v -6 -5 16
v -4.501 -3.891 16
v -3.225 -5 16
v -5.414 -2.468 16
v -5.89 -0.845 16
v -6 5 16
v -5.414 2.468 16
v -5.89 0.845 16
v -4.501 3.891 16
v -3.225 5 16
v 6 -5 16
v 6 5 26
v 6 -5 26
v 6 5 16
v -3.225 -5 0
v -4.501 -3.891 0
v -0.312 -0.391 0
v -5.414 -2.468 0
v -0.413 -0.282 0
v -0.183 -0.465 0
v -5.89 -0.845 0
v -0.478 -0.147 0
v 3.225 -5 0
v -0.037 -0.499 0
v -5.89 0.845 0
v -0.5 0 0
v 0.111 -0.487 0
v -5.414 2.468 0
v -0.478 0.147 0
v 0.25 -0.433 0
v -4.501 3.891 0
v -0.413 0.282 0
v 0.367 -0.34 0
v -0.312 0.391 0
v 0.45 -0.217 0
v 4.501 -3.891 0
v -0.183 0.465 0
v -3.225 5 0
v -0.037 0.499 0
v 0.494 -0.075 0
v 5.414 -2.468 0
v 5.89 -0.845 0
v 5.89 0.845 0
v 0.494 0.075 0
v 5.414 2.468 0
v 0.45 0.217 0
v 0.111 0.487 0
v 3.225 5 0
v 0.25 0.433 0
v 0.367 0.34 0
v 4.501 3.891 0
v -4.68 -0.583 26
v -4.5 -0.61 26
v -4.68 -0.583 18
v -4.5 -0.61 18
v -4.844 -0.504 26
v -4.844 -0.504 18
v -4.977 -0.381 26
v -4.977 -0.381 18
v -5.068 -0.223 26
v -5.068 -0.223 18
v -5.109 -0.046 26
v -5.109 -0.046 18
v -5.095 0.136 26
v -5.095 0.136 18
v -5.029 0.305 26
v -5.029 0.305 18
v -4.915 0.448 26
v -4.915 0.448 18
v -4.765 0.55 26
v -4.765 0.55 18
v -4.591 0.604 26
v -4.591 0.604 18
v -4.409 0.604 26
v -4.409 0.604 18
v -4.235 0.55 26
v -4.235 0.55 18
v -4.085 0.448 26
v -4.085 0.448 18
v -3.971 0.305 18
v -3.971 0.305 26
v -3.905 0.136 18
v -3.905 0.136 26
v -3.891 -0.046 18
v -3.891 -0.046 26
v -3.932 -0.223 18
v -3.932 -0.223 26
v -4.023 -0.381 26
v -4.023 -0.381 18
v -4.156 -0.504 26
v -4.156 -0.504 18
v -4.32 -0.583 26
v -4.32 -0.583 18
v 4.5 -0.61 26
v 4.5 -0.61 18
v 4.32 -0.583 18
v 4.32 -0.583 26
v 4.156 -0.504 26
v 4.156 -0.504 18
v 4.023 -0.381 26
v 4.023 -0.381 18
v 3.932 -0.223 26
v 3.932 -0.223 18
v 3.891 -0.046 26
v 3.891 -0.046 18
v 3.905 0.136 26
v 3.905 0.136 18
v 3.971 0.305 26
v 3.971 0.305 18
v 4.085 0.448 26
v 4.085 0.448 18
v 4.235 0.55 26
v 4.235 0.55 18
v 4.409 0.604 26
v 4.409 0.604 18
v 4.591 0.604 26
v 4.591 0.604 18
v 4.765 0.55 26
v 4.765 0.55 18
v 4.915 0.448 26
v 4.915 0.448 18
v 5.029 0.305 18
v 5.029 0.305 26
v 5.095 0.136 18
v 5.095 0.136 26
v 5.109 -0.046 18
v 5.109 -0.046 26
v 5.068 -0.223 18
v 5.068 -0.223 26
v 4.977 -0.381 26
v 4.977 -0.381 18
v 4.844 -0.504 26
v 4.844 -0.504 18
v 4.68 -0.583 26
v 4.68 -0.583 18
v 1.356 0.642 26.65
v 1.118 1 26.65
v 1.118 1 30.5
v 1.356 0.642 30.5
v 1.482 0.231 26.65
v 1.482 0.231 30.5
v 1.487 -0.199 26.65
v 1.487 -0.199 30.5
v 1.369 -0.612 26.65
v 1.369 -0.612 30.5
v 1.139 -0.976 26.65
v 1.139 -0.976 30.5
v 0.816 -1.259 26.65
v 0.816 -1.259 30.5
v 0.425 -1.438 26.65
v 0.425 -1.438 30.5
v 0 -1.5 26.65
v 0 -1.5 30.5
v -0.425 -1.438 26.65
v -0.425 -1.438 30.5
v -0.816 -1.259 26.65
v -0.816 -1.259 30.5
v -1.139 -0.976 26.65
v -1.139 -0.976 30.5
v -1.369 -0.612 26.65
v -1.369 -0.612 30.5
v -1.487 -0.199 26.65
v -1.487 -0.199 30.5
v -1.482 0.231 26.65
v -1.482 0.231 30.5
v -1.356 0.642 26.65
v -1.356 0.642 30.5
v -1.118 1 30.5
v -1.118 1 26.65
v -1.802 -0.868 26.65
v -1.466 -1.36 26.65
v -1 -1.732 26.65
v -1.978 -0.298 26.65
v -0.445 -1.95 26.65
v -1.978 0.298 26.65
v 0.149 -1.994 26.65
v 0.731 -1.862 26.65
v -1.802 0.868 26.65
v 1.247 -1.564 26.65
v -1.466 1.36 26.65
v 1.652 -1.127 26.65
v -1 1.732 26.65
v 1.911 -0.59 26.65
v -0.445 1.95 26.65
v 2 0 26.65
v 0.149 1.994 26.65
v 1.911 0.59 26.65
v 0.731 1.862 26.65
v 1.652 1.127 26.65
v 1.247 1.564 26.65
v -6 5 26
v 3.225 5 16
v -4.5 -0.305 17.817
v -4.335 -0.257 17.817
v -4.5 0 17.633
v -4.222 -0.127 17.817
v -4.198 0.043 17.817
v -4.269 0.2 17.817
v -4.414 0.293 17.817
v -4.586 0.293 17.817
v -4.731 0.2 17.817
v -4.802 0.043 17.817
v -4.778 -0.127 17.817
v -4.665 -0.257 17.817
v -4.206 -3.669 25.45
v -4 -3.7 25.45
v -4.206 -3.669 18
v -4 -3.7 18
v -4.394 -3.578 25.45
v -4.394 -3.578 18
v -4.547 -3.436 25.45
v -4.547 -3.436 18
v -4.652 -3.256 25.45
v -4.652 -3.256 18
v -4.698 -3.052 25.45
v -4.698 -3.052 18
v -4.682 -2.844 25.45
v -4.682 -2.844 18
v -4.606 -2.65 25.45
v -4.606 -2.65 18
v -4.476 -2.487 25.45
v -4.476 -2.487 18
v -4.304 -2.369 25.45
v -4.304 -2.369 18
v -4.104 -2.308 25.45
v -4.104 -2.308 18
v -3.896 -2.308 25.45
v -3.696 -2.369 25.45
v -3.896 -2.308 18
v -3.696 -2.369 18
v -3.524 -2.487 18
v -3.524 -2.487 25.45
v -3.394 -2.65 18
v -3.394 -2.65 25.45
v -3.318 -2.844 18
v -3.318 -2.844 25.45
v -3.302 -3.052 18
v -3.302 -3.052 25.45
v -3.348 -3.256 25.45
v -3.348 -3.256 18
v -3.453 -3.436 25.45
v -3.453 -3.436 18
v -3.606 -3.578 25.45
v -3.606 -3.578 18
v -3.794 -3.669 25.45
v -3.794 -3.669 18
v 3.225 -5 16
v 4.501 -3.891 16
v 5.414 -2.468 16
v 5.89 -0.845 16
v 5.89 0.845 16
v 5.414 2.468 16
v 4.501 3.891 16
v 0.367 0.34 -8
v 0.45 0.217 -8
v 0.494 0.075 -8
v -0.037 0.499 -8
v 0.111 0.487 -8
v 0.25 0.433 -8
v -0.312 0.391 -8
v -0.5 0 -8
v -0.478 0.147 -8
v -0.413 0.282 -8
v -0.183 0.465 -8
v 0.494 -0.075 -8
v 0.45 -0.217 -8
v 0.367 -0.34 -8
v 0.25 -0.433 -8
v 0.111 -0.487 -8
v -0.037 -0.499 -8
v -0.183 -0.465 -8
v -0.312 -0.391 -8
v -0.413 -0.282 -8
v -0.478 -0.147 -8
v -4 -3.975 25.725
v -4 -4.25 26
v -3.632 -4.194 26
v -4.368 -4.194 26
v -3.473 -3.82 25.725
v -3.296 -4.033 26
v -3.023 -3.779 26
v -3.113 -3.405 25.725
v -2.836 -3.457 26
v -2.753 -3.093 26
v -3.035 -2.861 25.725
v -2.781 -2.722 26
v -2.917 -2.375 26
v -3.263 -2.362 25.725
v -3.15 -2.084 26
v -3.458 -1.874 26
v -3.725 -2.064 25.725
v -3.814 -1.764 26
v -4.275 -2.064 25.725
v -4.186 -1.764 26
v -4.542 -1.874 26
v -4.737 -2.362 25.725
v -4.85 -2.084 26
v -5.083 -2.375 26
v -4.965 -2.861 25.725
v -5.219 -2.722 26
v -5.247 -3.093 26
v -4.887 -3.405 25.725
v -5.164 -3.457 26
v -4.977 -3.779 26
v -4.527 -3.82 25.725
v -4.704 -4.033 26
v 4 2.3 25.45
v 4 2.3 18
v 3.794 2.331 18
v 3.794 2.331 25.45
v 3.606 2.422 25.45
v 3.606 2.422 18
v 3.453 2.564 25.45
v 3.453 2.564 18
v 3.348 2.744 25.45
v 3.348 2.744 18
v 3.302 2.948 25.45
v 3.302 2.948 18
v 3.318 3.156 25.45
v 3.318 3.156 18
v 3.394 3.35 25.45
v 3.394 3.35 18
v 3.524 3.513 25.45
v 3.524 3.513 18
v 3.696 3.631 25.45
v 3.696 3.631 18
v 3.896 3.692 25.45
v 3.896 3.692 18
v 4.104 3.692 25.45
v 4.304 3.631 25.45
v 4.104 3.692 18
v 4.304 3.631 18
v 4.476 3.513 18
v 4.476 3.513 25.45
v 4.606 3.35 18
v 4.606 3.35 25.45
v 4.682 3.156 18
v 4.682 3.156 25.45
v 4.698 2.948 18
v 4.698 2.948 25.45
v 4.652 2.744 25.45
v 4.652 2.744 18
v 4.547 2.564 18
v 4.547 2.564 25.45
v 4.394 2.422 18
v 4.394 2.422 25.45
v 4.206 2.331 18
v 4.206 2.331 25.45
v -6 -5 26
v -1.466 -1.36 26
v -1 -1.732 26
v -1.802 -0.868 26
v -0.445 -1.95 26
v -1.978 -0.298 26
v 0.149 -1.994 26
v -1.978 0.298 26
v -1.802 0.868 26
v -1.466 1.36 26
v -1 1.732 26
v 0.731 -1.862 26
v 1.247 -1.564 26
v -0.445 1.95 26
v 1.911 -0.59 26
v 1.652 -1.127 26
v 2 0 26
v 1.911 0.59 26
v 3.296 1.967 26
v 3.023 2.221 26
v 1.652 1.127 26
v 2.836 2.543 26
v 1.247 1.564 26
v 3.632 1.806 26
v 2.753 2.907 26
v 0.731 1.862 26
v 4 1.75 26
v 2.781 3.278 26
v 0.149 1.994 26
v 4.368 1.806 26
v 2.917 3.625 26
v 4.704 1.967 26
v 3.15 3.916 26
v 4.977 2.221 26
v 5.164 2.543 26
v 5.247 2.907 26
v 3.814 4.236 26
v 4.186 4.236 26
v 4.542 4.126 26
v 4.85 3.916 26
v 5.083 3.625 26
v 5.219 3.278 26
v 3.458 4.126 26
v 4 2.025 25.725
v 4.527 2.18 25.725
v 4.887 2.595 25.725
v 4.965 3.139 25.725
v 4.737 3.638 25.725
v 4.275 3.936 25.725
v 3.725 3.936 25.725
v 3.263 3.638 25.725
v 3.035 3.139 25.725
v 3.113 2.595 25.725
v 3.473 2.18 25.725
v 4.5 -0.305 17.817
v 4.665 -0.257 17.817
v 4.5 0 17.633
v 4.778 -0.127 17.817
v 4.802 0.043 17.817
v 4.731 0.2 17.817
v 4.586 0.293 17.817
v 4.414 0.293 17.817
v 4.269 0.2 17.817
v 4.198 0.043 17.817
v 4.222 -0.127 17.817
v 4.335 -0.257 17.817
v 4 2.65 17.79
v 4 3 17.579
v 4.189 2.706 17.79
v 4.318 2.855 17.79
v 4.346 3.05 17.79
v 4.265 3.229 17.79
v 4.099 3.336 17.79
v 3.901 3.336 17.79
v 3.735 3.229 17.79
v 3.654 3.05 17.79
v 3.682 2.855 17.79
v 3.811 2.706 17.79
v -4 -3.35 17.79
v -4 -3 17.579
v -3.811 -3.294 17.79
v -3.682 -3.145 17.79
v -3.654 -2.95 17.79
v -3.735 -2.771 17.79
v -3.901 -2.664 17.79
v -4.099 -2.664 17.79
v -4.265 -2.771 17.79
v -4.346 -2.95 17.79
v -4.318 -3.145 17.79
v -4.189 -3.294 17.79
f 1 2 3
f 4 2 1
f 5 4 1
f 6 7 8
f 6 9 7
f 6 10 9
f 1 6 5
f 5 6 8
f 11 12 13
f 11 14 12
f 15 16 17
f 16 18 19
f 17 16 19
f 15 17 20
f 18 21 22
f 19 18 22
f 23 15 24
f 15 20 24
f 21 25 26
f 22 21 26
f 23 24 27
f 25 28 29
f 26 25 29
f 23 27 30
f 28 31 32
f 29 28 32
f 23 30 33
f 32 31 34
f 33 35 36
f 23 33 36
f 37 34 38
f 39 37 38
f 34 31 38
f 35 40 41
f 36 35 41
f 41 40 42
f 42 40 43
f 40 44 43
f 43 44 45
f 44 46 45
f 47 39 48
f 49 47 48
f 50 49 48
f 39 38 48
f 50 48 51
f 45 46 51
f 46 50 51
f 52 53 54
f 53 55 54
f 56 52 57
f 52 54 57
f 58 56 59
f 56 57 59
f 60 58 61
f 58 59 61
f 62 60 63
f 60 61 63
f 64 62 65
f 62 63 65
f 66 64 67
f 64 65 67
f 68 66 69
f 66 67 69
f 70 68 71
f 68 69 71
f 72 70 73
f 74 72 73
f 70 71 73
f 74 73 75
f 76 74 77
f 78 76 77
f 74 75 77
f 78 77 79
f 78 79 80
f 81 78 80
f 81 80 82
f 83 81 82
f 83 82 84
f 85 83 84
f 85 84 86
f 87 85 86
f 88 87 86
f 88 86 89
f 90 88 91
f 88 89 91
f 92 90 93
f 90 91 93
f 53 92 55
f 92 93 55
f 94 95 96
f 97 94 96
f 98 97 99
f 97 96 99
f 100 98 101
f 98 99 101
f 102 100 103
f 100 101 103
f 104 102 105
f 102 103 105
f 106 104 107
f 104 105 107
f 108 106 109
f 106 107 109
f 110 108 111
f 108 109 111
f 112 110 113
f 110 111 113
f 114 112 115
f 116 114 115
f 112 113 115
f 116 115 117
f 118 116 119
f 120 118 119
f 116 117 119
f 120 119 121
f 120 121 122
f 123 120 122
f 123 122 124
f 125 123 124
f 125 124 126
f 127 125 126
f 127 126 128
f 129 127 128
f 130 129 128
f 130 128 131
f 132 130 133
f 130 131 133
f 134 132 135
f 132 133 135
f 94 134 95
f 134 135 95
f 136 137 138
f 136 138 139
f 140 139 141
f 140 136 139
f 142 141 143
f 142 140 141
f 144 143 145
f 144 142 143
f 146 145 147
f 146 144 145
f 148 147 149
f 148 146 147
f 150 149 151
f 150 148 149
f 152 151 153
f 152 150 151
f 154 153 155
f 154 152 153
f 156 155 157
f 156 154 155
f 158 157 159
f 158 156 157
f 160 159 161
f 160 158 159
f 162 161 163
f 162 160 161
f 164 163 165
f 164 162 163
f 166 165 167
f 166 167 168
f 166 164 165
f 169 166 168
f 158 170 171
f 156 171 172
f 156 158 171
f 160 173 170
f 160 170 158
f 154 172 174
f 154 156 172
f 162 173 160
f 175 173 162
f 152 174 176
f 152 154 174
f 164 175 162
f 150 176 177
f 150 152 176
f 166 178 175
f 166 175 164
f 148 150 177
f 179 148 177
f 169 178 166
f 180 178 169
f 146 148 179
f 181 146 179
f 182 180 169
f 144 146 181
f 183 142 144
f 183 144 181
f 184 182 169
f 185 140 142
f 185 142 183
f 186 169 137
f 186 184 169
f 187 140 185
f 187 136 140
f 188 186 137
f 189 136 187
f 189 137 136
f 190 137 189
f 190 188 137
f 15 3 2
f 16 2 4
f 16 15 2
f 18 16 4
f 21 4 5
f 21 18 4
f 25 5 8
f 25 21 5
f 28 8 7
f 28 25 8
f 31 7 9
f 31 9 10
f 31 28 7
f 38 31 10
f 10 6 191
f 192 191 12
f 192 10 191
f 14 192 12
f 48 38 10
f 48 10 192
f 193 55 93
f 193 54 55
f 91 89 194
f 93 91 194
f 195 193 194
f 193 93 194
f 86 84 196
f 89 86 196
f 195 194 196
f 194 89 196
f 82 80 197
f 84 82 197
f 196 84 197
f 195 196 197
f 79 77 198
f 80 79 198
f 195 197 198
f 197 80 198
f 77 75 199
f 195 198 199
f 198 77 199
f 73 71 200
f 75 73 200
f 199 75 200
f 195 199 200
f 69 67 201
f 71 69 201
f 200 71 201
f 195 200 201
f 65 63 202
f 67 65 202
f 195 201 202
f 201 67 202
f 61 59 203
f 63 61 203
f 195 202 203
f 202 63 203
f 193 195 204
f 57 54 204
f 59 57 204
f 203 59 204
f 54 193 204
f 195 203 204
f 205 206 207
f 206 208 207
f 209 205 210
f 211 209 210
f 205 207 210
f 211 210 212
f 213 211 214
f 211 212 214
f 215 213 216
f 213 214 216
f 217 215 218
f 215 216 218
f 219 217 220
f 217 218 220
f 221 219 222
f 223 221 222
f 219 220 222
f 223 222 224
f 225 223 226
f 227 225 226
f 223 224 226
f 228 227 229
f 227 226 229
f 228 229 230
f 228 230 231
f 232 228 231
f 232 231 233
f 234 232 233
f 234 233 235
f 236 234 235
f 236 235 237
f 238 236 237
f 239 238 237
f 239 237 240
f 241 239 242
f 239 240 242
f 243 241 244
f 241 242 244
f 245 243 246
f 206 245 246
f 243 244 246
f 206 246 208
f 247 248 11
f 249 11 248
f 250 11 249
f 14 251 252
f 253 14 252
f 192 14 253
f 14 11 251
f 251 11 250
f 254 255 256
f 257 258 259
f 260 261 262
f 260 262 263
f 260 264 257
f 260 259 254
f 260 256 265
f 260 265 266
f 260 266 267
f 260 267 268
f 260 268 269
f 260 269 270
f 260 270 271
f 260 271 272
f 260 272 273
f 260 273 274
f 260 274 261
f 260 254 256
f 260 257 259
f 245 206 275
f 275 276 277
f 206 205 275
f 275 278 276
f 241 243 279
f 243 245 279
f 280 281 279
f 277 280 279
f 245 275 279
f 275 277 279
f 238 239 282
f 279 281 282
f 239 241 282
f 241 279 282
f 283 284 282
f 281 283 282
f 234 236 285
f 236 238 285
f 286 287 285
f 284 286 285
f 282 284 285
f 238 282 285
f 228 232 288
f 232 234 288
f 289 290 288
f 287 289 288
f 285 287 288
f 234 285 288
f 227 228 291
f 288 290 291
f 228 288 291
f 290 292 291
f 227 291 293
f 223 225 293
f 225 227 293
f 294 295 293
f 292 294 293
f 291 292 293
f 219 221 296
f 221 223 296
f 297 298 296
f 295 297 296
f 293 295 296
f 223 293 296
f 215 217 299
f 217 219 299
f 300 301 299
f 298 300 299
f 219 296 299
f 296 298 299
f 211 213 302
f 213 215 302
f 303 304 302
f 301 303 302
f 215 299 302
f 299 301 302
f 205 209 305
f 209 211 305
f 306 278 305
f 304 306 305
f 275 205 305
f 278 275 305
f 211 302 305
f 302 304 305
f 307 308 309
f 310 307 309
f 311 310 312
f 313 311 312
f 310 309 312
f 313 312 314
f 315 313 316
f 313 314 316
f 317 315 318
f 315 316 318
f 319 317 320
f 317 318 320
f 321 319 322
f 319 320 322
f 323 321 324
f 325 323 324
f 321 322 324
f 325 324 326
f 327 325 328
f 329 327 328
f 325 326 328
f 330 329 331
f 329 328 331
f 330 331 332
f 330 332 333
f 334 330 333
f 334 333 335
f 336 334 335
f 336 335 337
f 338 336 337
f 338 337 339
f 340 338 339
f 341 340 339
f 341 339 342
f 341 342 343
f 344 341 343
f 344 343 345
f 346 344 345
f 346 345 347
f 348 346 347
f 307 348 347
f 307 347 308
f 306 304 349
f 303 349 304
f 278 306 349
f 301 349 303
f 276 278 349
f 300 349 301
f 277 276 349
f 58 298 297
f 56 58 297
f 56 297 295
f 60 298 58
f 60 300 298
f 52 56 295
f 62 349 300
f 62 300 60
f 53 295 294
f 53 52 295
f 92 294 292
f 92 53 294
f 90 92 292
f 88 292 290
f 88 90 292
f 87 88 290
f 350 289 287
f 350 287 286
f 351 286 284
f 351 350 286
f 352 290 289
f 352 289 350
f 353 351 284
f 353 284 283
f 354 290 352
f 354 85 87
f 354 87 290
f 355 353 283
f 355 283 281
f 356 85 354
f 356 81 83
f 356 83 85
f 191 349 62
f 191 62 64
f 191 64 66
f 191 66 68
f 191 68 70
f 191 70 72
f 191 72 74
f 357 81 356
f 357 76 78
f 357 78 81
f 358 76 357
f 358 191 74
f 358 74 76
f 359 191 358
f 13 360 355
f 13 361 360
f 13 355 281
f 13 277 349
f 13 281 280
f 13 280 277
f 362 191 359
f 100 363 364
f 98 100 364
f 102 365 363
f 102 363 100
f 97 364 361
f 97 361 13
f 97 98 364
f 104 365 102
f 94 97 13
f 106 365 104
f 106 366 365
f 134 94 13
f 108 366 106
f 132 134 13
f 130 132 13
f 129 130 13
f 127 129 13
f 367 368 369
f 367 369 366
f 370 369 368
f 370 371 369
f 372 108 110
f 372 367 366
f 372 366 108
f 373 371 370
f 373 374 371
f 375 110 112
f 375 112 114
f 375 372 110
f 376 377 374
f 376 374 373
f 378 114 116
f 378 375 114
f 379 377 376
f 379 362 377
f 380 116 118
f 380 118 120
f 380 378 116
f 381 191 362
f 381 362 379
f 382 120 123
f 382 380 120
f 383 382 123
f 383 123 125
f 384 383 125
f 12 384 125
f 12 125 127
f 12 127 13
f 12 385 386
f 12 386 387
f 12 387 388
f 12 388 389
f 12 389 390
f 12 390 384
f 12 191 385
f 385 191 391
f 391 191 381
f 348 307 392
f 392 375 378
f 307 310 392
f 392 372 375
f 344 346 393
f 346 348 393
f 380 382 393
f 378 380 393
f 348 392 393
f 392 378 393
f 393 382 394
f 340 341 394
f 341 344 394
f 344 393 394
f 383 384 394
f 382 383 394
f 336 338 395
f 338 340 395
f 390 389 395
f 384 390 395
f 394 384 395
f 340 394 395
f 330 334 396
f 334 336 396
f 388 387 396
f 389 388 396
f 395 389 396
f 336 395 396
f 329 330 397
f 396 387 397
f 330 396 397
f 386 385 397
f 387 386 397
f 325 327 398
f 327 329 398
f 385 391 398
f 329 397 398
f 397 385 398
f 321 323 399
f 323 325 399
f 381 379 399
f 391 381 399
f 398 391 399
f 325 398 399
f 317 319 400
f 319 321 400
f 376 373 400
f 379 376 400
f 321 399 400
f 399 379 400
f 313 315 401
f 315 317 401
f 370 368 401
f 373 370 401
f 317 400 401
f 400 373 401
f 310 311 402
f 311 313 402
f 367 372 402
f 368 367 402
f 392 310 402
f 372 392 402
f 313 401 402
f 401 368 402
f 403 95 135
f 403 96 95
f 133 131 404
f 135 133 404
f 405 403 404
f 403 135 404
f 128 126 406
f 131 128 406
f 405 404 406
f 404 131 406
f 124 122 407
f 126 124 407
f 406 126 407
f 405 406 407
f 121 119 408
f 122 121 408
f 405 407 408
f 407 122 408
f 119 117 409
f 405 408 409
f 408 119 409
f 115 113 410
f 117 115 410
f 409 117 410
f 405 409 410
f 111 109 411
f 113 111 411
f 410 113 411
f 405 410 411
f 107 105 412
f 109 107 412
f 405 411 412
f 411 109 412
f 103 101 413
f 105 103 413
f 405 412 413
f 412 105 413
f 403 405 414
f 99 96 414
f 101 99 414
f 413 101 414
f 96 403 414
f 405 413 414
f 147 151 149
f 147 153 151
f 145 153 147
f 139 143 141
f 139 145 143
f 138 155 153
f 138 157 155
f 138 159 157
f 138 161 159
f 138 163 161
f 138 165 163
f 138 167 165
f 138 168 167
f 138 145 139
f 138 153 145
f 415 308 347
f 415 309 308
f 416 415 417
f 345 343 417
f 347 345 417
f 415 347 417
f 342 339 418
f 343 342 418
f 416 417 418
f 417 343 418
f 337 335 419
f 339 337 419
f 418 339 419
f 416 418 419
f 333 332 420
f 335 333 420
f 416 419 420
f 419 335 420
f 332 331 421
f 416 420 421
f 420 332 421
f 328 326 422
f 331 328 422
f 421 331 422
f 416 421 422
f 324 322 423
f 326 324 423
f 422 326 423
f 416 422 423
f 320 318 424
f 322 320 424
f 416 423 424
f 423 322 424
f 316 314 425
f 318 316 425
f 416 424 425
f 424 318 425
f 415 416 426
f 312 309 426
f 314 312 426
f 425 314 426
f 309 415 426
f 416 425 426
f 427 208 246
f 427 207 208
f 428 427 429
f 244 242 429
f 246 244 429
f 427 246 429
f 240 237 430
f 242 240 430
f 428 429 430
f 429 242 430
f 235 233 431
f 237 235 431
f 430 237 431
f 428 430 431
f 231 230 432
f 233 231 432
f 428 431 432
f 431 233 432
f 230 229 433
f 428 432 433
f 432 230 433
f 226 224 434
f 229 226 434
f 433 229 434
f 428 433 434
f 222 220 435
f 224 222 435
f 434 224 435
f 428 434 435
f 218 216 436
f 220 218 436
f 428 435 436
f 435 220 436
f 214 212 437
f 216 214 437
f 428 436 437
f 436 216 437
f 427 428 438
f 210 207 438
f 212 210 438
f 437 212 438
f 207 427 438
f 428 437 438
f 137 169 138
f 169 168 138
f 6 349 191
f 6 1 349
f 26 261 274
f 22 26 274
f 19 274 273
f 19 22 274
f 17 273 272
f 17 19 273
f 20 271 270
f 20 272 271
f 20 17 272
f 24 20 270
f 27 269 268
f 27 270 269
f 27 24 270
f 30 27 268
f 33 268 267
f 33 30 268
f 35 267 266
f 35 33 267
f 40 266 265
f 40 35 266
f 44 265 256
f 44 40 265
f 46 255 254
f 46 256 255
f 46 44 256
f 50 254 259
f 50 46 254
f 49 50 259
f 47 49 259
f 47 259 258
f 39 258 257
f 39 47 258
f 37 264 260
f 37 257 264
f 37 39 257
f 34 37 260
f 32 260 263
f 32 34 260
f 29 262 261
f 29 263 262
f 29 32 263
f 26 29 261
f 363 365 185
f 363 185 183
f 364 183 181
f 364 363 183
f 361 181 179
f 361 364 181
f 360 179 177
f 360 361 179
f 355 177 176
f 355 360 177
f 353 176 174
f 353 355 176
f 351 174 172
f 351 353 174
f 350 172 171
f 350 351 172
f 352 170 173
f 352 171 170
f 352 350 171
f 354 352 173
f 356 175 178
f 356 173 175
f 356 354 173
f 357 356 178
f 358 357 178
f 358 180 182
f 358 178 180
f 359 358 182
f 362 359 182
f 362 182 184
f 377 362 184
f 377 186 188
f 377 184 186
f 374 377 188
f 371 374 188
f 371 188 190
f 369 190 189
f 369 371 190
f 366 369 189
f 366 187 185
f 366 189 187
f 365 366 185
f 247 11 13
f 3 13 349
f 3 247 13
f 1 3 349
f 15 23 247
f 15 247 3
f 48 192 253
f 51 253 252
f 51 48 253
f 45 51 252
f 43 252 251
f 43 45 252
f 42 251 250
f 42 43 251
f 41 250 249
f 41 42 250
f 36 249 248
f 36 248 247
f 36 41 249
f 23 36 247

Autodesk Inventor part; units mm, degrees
ref_plane "YZ Plane" through (0, 0, 0) normal (1, 0, 0) x (0, 1, 0)
ref_plane "XZ Plane" through (0, 0, 0) normal (0, 1, 0) x (-1, 0, 0)
ref_plane "XY Plane" through (0, 0, 0) normal (0, 0, 1) x (1, 0, 0)
sketch "Skizze1" plane through (0, 0, 0) normal (0, 0, 1) x (1, 0, 0)
  line L0 (-8.4, 0) -> (8.4, 0) projected
  line L1 (0, -7) -> (0, 7) projected
  line L2 (-6, 5) -> (6, 5)
  line L3 (6, 5) -> (6, -5)
  line L4 (6, -5) -> (-6, -5)
  line L5 (-6, -5) -> (-6, 5)
  point P0 (0, 0)
  dimension "d0" = 10
  dimension "d1" = 12
extrude "Extrusion1" add sketch "Skizze1" along normal blind 26
sketch "Skizze2" plane through (0, 0, 26) normal (0, 0, 1) x (1, 0, 0)
  circle A0 centre (0, 0) radius 2
  dimension "d4" = 4
extrude "Extrusion2" add sketch "Skizze2" along normal blind 0.65
sketch "Skizze3" plane through (0, 0, 26) normal (0, 0, 1) x (1, 0, 0)
  circle A0 centre (0, 0) radius 2 projected
  circle A1 centre (0, 0) radius 1.5
  dimension "d7" = 3
extrude "Extrusion3" add sketch "Skizze3" along normal blind 4.5 contours A1
sketch "Skizze4" plane through (0, 0, 26) normal (0, 0, 1) x (1, 0, 0)
  line L0 (-8.4, 0) -> (8.4, 0) projected
  line L1 (0, -7) -> (0, 7) projected
  line L2 (-4, 3) -> (4, 3)
  line L3 (4, 3) -> (4, -3)
  line L4 (4, -3) -> (-4, -3)
  line L5 (-4, -3) -> (-4, 3)
  dimension "d10" = 6
  dimension "d11" = 8
hole "Bohrung1" at (-4, -3, 26) at (4, 3, 26) at (-4, -3, 26) at (4, 3, 26) direction (0, 0, -1) diameter 1.4 depth 8 tip angle 118 countersink diameter 2.5 countersink angle 90
sketch "Skizze5" plane through (0, 0, 26) normal (0, 0, 1) x (1, 0, 0)
  line L0 (-8.4, 0) -> (8.4, 0) projected
  line L1 (0, -7) -> (0, 7) projected
  point P0 (-4.5, 0)
  point P1 (4.5, 0)
  dimension "d19" = 9
hole "Bohrung2" at (-4.5, 0, 26) at (4.5, 0, 26) direction (0, 0, -1) diameter 1.221 depth 8 tip angle 118 thread size "M1.6x0.35" class "6H" standard "ISO Metric profile"
sketch "Skizze6" plane through (0, 0, 0) normal (0, 0, -1) x (-1, 0, 0)
  circle A0 centre (0, 0) radius 0.5
  dimension "d27" = 1
extrude "Extrusion4" add sketch "Skizze6" along normal blind 8
sketch "Skizze8" plane through (0, 0, 0) normal (0, 0, -1) x (-1, 0, 0)
  circle A0 centre (0, 0) radius 0.5 projected
  line L0 (6, 5) -> (-6, 5) projected
  line L1 (-6, 5) -> (-6, -5) projected
  line L2 (-6, -5) -> (6, -5) projected
  line L3 (6, -5) -> (6, 5) projected
  arc A1 (-3.2253, 5) -> (-3.2253, -5) centre (0, 0) ccw
  arc A2 (3.2253, -5) -> (3.2253, 5) centre (0, 0) ccw
  dimension "d38" = 5.95
  dimension "d39" = 5.95
extrude "Extrusion6" cut sketch "Skizze8" against normal blind 16 contours L3 L2 A2 L0 | A1 L2 L1 L0
sketch "Skizze9" plane through (0, 0, 30.5) normal (0, 0, 1) x (1, 0, 0)
  circle A0 centre (0, 0) radius 1.5 projected
  line L0 (-1.118, 1) -> (1.118, 1)
  dimension "d42" = 1
extrude "Extrusion7" cut sketch "Skizze9" against normal up to surface (3.85 mm away) contours L0 A0 picked at (-0.0599, 1.1631)
properties part number "Motor XDRIVE GM12F"
